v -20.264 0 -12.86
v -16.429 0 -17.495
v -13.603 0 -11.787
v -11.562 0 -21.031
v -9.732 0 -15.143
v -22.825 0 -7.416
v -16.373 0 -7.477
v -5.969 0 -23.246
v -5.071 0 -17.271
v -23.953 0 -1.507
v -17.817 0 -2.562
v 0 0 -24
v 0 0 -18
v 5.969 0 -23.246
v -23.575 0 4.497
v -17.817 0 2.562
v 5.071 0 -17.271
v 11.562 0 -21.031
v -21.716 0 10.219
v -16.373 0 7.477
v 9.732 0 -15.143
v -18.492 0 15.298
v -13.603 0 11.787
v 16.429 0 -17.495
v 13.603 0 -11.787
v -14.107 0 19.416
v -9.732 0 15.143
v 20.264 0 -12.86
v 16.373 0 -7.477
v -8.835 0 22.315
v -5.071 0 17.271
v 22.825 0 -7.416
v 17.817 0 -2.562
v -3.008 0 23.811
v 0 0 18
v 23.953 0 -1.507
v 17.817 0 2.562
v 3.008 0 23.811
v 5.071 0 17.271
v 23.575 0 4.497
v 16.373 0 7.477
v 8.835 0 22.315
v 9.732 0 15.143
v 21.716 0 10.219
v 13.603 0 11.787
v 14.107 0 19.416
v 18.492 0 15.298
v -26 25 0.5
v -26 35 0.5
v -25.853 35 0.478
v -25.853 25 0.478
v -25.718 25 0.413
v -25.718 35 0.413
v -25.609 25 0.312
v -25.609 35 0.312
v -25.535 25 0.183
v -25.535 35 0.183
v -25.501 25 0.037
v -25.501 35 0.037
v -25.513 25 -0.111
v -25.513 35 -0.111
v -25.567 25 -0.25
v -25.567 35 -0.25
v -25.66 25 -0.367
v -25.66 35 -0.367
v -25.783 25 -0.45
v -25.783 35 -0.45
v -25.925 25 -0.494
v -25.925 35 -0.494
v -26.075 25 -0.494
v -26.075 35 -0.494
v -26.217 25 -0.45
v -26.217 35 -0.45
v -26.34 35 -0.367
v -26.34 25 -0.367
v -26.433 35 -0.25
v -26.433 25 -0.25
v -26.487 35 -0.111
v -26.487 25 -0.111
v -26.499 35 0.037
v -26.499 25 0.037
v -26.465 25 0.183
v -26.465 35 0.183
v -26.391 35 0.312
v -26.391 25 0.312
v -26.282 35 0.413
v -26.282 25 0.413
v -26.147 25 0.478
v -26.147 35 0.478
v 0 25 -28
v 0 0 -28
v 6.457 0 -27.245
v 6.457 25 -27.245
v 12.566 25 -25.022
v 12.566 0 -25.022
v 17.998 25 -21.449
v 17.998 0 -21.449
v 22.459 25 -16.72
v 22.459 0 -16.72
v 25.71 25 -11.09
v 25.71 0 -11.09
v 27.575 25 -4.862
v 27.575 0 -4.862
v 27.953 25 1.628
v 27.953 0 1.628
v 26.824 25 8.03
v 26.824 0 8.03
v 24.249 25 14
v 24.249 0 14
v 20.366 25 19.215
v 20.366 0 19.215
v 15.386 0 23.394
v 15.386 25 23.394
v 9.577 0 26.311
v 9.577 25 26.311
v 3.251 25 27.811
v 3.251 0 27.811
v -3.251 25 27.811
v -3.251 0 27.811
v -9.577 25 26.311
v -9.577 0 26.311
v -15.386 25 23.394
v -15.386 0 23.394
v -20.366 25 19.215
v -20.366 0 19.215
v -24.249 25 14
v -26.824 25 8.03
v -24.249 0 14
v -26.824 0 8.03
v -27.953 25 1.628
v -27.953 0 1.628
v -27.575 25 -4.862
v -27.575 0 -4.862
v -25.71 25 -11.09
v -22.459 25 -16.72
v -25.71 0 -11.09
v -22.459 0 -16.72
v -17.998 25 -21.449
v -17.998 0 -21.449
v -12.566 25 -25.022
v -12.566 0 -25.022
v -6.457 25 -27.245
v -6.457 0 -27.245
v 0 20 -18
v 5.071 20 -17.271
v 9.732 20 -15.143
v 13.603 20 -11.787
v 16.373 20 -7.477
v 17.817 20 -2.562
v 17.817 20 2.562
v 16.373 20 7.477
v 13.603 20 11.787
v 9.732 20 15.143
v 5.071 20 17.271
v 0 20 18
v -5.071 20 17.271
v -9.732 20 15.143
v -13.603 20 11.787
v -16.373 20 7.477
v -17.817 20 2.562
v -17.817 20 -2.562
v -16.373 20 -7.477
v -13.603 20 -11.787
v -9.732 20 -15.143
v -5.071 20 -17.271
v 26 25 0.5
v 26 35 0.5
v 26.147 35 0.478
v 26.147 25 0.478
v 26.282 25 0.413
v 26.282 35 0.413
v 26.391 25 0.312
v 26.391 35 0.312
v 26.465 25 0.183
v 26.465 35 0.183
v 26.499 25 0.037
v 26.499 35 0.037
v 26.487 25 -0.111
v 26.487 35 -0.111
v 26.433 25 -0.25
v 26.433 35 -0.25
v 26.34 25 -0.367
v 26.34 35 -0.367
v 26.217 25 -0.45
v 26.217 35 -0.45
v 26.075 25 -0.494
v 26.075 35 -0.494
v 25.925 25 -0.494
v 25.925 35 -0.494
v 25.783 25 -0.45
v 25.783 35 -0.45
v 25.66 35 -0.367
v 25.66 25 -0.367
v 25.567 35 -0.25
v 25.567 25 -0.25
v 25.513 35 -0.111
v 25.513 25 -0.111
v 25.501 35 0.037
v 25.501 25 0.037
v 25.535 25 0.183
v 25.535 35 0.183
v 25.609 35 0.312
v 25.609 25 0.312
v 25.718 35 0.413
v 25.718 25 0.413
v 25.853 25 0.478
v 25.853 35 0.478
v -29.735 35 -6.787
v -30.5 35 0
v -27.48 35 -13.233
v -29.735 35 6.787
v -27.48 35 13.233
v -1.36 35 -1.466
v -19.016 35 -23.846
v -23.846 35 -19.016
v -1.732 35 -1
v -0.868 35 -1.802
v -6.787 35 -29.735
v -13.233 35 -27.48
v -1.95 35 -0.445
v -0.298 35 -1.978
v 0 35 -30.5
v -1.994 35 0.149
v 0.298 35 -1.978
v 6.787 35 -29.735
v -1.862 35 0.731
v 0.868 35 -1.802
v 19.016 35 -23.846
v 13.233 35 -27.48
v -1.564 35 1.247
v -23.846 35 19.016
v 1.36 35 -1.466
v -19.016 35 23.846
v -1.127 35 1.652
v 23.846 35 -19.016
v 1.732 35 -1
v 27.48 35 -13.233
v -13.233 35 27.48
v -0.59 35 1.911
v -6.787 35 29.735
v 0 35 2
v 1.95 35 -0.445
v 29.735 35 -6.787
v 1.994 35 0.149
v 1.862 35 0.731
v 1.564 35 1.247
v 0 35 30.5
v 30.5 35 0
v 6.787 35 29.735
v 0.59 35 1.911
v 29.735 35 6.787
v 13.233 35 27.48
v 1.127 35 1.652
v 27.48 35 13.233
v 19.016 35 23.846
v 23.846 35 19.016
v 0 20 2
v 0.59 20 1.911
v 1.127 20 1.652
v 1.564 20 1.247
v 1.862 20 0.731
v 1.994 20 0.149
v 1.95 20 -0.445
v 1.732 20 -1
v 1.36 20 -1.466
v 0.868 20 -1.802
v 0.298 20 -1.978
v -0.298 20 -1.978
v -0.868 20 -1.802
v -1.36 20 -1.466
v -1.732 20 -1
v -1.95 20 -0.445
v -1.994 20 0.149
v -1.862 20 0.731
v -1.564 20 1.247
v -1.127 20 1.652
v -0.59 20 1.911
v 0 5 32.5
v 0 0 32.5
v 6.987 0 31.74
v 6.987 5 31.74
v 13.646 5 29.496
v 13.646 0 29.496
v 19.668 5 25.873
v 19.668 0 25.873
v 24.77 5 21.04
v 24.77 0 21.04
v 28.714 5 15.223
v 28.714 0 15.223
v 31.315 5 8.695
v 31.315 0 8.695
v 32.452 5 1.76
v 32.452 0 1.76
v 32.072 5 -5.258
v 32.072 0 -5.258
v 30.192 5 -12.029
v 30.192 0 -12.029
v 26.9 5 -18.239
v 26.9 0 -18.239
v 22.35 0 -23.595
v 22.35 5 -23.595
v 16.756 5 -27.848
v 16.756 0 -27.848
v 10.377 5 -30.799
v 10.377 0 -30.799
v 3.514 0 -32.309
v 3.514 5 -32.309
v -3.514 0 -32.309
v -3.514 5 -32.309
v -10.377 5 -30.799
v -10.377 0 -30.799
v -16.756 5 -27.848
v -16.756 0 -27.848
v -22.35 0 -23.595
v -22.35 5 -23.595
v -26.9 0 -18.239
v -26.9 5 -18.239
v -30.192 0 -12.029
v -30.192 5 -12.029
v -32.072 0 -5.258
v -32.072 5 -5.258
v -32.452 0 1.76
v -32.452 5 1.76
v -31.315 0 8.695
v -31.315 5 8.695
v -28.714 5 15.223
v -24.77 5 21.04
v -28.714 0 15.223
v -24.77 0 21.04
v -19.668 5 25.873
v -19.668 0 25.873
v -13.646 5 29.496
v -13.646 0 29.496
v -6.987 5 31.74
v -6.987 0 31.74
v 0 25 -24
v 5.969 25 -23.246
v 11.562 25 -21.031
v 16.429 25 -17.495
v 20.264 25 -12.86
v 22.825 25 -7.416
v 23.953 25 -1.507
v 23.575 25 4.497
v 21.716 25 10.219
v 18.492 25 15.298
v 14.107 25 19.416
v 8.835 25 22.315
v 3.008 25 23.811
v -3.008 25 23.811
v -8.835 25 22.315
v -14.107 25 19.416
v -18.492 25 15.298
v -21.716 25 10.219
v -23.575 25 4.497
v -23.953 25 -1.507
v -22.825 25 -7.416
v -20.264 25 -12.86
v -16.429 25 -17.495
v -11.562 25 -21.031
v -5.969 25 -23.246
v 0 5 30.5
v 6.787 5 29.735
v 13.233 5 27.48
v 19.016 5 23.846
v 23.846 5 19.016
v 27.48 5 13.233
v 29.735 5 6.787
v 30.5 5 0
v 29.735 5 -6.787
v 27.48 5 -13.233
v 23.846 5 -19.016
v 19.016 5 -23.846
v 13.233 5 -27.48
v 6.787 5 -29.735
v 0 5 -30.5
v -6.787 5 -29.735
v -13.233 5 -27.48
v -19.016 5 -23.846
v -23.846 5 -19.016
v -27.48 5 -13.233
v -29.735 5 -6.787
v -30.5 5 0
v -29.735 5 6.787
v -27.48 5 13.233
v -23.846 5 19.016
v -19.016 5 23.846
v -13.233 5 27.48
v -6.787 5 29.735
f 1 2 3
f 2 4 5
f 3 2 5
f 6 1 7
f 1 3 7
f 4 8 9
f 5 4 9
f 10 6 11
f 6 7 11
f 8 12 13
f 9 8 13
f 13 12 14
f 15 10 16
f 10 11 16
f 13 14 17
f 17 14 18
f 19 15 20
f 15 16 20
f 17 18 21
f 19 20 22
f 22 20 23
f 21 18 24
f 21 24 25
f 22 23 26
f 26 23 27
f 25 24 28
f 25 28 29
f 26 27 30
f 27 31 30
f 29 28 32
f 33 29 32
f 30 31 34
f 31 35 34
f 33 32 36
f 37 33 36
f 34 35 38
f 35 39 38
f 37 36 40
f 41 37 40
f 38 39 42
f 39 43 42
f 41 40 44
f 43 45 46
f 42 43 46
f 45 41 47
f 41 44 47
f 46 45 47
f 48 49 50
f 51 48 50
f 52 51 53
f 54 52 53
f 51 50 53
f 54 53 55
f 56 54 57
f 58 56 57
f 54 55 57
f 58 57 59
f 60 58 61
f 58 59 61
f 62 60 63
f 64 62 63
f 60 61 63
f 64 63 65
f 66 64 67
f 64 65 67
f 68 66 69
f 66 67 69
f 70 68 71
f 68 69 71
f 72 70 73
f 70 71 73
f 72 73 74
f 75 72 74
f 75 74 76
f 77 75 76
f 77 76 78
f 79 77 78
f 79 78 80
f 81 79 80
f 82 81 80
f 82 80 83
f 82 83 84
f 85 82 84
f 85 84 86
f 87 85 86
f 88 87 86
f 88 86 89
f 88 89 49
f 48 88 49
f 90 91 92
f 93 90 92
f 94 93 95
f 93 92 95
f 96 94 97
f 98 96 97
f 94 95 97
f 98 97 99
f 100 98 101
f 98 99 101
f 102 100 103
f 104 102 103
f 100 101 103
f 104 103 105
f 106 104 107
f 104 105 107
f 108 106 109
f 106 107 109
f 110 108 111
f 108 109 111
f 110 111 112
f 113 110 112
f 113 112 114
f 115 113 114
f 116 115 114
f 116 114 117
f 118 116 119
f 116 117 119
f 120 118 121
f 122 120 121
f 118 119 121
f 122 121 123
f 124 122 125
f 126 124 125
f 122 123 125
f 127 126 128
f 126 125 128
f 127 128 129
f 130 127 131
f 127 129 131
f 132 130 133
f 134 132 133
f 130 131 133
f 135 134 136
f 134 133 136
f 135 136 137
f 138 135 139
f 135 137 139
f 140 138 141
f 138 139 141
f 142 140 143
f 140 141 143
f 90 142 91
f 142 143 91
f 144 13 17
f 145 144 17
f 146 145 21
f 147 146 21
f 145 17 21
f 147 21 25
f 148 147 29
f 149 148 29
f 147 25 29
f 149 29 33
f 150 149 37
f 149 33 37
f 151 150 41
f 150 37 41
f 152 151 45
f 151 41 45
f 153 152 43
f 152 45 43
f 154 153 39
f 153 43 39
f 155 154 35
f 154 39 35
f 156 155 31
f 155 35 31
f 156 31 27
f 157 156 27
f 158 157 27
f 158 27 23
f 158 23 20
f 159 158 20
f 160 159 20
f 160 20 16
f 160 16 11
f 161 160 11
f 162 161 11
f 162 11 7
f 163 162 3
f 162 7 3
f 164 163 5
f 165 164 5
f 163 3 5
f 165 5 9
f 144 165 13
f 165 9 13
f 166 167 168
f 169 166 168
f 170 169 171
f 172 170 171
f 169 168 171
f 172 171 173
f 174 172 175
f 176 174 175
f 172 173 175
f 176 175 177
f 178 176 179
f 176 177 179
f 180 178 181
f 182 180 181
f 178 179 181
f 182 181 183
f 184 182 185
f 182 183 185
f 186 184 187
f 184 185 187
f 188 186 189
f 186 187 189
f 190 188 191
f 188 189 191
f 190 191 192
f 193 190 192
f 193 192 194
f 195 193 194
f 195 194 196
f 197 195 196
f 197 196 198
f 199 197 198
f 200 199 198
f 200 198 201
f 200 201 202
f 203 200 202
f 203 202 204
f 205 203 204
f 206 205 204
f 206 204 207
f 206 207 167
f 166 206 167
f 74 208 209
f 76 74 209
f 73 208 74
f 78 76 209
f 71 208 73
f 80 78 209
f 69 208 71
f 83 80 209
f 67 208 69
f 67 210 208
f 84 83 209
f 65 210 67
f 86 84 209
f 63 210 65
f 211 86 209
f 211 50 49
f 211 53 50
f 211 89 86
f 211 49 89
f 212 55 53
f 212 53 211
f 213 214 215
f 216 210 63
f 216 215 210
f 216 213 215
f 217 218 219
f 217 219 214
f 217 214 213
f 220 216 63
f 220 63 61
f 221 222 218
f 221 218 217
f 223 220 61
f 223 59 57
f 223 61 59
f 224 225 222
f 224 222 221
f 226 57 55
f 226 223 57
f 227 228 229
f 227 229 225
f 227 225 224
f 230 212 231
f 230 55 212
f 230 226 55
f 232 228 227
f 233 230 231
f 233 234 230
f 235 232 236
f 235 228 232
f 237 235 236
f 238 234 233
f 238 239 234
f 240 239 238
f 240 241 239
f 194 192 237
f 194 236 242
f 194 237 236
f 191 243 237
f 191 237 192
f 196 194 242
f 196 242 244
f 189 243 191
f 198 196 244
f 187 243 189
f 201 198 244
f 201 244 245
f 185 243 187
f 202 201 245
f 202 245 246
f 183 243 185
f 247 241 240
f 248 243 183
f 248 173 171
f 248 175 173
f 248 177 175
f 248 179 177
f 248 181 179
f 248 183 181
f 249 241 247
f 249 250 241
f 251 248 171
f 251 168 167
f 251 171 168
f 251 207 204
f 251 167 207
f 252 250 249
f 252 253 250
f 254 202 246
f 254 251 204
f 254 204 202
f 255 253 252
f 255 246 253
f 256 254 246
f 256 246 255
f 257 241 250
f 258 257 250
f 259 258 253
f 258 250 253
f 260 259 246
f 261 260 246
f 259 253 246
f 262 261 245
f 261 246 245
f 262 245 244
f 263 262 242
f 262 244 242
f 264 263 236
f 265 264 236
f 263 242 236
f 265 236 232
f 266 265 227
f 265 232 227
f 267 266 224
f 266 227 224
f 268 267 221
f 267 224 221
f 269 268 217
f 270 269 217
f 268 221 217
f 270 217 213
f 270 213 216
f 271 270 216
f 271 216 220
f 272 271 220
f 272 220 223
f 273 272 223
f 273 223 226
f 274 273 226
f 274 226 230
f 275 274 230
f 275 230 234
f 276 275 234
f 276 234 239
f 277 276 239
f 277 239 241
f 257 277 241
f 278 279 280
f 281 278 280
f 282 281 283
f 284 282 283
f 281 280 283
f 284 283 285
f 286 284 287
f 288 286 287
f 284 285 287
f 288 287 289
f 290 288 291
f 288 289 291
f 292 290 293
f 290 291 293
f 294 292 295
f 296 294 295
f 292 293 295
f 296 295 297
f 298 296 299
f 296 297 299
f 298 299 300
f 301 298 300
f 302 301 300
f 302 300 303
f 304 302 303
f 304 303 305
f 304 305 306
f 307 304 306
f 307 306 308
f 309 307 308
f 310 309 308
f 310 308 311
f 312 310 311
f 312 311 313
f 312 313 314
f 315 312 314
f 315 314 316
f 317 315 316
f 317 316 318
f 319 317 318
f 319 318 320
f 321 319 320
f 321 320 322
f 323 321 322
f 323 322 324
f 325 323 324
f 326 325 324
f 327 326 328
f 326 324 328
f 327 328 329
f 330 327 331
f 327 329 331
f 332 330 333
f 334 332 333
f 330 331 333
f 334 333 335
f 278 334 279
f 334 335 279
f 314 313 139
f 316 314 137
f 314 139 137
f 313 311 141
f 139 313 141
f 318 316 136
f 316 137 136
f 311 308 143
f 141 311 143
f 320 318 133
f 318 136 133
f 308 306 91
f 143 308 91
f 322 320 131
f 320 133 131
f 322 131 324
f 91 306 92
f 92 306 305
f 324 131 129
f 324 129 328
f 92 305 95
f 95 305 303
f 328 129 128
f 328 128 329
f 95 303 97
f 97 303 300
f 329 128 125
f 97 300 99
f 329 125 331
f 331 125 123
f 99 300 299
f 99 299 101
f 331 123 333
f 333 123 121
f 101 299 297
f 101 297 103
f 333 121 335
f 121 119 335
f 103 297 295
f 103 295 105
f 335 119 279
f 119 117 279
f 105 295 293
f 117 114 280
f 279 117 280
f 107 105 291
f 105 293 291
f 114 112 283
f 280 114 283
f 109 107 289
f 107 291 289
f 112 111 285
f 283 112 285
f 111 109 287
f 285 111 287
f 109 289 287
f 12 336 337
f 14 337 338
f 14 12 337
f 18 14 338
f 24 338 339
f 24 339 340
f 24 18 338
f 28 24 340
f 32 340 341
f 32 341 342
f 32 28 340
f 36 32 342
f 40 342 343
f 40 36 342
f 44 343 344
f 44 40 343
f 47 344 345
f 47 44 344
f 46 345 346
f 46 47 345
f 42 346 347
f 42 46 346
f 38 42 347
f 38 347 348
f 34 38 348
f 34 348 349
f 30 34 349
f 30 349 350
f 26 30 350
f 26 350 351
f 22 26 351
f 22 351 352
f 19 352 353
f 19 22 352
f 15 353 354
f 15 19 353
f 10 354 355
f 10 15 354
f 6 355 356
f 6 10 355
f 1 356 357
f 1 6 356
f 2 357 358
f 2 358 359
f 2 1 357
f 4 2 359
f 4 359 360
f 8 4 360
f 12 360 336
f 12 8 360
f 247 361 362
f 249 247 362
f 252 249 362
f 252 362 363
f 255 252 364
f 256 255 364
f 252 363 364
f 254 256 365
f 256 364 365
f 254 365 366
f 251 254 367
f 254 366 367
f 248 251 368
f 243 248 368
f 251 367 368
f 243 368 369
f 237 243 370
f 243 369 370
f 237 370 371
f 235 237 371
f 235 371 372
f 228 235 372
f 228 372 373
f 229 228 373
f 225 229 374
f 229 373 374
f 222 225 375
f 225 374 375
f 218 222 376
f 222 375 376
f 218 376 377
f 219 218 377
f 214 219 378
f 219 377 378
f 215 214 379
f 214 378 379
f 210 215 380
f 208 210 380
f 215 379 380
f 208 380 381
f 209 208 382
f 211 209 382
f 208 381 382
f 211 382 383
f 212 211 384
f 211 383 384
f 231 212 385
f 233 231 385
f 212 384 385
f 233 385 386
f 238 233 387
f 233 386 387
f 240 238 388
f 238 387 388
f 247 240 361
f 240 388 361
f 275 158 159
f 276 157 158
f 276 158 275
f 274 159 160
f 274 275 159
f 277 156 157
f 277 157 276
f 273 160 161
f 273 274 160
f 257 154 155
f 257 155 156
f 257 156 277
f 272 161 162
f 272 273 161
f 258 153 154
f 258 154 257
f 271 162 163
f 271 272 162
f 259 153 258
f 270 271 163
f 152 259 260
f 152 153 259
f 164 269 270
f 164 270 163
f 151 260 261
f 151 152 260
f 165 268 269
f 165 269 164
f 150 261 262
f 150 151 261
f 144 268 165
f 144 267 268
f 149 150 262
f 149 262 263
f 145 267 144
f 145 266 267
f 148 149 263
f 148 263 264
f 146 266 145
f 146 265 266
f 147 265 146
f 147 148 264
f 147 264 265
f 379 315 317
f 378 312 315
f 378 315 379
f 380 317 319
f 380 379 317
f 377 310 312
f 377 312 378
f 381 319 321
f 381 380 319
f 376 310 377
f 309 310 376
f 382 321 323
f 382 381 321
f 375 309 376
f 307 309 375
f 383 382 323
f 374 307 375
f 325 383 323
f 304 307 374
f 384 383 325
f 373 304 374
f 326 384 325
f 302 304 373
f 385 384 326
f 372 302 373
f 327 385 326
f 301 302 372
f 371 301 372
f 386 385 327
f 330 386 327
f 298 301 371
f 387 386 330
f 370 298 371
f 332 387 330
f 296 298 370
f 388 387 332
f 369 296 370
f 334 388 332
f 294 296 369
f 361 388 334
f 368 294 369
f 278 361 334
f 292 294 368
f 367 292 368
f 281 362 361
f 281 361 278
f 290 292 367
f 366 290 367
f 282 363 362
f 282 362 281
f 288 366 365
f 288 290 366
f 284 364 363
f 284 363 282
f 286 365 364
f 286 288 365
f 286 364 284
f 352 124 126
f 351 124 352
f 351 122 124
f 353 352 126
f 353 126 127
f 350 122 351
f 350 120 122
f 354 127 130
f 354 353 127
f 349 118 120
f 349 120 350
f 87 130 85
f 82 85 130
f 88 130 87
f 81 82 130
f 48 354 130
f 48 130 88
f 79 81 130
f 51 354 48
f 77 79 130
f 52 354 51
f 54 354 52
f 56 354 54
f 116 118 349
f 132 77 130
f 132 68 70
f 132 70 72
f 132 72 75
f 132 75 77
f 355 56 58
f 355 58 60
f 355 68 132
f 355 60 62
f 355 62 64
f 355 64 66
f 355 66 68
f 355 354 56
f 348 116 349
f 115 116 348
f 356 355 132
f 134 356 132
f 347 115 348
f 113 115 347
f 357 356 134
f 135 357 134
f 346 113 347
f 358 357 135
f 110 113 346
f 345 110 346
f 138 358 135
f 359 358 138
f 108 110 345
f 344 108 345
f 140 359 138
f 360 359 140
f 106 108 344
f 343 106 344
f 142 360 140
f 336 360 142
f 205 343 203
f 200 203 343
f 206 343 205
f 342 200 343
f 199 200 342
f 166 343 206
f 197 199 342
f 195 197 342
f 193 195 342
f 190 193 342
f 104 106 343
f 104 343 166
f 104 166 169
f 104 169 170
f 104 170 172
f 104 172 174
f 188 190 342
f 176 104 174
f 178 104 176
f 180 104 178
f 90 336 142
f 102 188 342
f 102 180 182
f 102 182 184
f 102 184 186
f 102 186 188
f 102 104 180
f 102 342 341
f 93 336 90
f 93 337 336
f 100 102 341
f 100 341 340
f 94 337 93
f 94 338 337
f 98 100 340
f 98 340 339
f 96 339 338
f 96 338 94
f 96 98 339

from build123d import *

# Parameters (mm, degrees)
SKETCH1_R           = 32.5
BOSS_EXTRUDE1_DEPTH = 35
CUT_EXTRUDE2_START  = -30
SKETCH2_R           = 32.5
SKETCH2_R_2         = 30.5
CUT_EXTRUDE2_DEPTH  = 30
SKETCH3_R           = 28
SKETCH3_R_2         = 24
CUT_EXTRUDE3_DEPTH  = 25
SKETCH4_R           = 18
CUT_EXTRUDE4_DEPTH  = 20
SKETCH5_R           = 0.5
CUT_EXTRUDE5_DEPTH  = 58.771100041
SKETCH6_R           = 2
CUT_EXTRUDE6_DEPTH  = 58.771100041


with BuildPart() as part:
    # Sketch1 → Boss-Extrude1 (new body)
    with BuildSketch(Plane(origin=(0, 0, 0), x_dir=(1, 0, 0), z_dir=(0, 1, 0))):
        with Locations(Location((0, 0, 0), (0, 0, 270))):
            Circle(SKETCH1_R)
    extrude(amount=BOSS_EXTRUDE1_DEPTH)

    # Sketch2 → Cut-Extrude2 (cut)
    with BuildSketch(Plane(origin=(0, 35, 0), x_dir=(1, 0, 0), z_dir=(0, 1, 0)).offset(CUT_EXTRUDE2_START)):
        with Locations(Location((0, 0, 0), (0, 0, 270))):
            Circle(SKETCH2_R)
        with Locations(Location((0, 0, 0), (0, 0, 270))):
            Circle(SKETCH2_R_2, mode=Mode.SUBTRACT)
    extrude(amount=CUT_EXTRUDE2_DEPTH, mode=Mode.SUBTRACT)

    # Sketch3 → Cut-Extrude3 (cut)
    with BuildSketch(Plane.XZ):
        with Locations(Location((0, 0, 0), (0, 0, 270))):
            Circle(SKETCH3_R)
        with Locations(Location((0, 0, 0), (0, 0, 270))):
            Circle(SKETCH3_R_2, mode=Mode.SUBTRACT)
    extrude(amount=-CUT_EXTRUDE3_DEPTH, mode=Mode.SUBTRACT)

    # Sketch4 → Cut-Extrude4 (cut)
    with BuildSketch(Plane.XZ):
        with Locations(Location((0, 0, 0), (0, 0, 270))):
            Circle(SKETCH4_R)
    extrude(amount=-CUT_EXTRUDE4_DEPTH, mode=Mode.SUBTRACT)

    # Sketch5 → Cut-Extrude5 (cut, through all)
    with BuildSketch(Plane(origin=(0, 35, 0), x_dir=(1, 0, 0), z_dir=(0, 1, 0))):
        with Locations(Location((-26, 0, 0), (0, 0, 270))):
            Circle(SKETCH5_R)
        with Locations(Location((26, 0, 0), (0, 0, 270))):
            Circle(SKETCH5_R)
    extrude(amount=-CUT_EXTRUDE5_DEPTH, mode=Mode.SUBTRACT)

    # Sketch6 → Cut-Extrude6 (cut, through all)
    with BuildSketch(Plane(origin=(0, 35, 0), x_dir=(1, 0, 0), z_dir=(0, 1, 0))):
        with Locations(Location((0, 0, 0), (0, 0, 270))):
            Circle(SKETCH6_R)
    extrude(amount=-CUT_EXTRUDE6_DEPTH, mode=Mode.SUBTRACT)


solid = part.part
